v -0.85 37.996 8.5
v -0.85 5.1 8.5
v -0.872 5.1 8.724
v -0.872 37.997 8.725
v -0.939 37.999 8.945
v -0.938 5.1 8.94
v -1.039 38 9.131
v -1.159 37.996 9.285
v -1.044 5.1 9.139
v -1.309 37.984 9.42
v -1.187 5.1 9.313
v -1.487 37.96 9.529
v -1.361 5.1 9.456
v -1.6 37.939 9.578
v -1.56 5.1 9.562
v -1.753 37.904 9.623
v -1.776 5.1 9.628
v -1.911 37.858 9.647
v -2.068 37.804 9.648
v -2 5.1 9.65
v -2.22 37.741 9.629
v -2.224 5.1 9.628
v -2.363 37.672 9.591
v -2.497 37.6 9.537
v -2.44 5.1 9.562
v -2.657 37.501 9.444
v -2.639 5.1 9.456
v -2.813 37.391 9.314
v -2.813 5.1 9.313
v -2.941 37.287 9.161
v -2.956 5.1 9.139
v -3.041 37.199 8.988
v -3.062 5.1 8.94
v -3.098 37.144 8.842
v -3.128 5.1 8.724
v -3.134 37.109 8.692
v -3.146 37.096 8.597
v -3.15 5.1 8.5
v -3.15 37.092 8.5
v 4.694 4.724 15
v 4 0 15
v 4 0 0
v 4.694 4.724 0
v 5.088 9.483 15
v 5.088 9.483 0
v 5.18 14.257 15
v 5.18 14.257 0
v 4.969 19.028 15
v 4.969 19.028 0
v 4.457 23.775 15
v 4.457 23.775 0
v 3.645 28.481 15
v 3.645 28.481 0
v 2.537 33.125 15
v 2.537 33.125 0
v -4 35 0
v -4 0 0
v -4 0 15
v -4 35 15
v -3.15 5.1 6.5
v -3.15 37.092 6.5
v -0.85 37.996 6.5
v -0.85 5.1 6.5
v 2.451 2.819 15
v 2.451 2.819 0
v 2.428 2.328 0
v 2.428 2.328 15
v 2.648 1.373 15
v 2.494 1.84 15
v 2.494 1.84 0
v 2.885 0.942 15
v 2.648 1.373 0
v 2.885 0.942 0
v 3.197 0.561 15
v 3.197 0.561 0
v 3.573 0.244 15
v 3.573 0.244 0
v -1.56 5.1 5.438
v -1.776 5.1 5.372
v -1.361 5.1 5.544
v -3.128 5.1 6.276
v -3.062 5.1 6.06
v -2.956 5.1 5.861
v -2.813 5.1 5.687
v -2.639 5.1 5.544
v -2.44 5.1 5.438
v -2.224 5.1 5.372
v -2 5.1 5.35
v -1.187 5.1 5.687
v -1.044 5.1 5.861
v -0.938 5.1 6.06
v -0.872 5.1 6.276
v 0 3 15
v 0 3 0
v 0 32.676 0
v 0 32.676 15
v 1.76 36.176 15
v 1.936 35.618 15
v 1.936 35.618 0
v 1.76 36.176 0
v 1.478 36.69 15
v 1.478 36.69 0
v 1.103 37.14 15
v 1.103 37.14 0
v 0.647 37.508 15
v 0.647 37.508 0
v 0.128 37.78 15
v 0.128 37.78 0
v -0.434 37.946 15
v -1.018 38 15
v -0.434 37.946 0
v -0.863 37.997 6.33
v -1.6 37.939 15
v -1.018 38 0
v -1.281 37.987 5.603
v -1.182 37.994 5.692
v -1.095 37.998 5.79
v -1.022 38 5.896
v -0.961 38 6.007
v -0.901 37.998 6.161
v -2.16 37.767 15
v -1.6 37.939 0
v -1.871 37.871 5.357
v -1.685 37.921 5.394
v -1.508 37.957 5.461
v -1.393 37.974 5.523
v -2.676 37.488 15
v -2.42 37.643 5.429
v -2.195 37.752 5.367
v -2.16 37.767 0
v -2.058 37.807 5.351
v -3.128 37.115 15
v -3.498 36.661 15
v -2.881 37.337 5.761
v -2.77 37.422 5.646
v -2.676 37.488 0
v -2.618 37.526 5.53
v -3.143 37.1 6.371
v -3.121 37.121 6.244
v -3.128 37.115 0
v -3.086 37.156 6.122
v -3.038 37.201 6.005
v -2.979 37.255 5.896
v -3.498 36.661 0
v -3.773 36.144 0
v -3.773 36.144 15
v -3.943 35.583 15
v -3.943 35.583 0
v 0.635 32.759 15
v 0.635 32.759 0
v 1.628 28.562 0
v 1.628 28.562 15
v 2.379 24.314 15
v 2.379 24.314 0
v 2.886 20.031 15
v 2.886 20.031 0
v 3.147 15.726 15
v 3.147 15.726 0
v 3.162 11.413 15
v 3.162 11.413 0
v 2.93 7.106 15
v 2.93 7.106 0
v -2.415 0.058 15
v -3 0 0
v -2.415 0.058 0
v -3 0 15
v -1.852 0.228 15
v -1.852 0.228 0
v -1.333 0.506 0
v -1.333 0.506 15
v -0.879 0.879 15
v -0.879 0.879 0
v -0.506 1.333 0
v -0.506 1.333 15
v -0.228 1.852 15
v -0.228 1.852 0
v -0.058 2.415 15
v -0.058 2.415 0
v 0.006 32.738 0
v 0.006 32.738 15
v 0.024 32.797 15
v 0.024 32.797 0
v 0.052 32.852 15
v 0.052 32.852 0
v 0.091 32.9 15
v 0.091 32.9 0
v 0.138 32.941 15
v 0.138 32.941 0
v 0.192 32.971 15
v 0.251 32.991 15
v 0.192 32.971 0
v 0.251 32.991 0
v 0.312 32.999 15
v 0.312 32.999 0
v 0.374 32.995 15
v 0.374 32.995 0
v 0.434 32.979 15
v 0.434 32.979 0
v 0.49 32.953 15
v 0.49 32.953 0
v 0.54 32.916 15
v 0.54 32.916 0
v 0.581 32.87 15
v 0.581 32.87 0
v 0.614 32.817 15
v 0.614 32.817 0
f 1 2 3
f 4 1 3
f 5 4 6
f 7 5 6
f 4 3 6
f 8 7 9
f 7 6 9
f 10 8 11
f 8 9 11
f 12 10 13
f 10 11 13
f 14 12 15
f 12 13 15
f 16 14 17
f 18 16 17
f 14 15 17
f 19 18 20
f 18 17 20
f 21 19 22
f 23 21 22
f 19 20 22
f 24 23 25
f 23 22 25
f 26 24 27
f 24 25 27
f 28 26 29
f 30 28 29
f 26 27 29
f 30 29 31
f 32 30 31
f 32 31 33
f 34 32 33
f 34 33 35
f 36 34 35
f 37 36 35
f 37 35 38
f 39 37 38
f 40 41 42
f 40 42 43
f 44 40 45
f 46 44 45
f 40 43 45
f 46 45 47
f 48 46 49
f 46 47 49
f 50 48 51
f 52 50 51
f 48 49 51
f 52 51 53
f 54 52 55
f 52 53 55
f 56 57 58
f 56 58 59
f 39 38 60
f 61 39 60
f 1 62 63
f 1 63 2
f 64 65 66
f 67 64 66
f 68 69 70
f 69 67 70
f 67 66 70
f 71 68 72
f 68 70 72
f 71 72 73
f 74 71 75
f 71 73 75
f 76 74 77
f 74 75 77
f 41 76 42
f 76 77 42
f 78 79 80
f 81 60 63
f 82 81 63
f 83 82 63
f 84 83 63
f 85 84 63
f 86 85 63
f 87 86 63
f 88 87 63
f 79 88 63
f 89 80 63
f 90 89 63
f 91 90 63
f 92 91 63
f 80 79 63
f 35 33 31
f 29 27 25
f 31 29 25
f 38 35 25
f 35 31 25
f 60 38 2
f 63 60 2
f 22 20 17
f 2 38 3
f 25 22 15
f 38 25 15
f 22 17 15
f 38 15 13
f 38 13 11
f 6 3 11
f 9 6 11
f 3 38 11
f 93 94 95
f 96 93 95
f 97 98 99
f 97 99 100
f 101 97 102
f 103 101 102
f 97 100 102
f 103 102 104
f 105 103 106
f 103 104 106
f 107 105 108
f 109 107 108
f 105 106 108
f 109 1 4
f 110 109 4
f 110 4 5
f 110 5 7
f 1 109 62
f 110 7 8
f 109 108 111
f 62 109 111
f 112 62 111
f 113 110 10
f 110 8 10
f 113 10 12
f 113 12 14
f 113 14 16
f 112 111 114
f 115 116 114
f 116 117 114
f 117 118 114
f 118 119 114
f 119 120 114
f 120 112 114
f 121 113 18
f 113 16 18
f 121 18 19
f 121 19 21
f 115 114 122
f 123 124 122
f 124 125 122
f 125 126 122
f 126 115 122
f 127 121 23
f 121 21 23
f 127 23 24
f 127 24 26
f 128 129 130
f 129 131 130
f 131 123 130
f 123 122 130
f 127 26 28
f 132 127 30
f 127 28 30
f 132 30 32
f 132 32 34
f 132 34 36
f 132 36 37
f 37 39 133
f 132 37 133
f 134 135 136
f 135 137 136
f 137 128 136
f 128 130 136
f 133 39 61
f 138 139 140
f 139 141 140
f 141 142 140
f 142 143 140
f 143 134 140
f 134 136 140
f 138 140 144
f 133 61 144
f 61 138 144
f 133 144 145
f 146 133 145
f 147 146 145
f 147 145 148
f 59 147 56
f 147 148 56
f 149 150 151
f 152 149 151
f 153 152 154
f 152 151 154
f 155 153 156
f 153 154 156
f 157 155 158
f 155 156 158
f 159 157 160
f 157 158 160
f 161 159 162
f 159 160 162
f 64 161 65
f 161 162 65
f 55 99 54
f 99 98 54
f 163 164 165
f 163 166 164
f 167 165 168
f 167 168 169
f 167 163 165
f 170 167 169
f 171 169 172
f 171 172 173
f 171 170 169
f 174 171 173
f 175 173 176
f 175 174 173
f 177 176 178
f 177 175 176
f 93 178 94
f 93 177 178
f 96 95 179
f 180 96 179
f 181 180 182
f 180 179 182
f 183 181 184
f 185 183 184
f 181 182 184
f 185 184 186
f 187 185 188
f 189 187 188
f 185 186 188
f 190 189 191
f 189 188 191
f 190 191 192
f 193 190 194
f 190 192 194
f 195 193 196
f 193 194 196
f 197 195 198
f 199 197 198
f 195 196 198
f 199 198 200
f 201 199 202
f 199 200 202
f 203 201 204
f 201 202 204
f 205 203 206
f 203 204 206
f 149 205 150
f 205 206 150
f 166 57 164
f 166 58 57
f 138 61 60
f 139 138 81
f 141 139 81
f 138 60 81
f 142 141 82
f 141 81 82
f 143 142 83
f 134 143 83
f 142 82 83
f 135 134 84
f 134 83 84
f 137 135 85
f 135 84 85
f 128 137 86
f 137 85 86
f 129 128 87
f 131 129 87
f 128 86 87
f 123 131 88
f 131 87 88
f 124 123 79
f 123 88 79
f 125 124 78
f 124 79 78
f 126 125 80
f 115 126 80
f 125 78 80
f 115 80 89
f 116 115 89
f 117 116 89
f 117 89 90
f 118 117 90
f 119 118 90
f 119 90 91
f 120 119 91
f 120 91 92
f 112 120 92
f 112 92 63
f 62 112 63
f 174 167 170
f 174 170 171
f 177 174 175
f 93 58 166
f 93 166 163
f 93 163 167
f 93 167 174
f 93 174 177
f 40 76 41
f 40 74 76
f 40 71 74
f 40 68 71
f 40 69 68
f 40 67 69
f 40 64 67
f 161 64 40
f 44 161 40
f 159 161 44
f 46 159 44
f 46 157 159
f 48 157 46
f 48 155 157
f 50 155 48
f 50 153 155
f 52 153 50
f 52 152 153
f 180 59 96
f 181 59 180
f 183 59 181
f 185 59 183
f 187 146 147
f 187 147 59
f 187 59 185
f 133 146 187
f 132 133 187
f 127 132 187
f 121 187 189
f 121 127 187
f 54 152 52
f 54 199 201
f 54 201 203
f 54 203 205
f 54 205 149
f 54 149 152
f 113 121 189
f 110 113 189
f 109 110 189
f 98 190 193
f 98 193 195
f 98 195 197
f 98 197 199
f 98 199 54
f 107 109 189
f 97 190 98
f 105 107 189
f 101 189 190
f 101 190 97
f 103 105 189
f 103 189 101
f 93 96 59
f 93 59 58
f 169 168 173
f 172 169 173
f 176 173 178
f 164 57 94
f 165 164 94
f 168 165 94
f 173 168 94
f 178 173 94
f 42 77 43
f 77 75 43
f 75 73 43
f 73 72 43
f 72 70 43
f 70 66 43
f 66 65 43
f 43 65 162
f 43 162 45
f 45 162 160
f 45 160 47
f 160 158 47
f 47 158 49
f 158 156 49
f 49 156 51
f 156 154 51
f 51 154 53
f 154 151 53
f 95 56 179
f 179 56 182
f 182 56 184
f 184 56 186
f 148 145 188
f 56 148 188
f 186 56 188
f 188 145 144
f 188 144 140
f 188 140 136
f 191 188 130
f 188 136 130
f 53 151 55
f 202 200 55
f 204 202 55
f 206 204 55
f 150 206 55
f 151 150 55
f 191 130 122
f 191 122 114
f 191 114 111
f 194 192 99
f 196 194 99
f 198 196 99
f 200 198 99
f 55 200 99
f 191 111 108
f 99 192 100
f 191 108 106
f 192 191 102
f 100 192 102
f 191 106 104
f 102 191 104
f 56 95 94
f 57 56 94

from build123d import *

# Parameters (mm, degrees)
F0_W        = 4
F0_H        = 35
F1_DEPTH    = 15
F2_T1_DEPTH = 15
F3_T1_DEPTH = 29.2746233567
F5_DEPTH    = 47
F6_DEPTH    = 5.1
F7_R        = 3
F8_R        = 43.7697785777


# Not quite as in the source:
# - a fillet or chamfer that OpenCascade refuses, or shapes differently, is made with other operations: its cross-section is extruded or revolved along the edge and cut away or added


with BuildPart() as f1:
    # F0 (on Top) → F1 (new body)
    with BuildSketch(Plane.XY):
        with Locations((-2, 17.5)):
            Rectangle(F0_W, F0_H)
        with BuildLine():
            Line((-4, 35), (0, 35))
            ThreePointArc((0, 35), (3.0631994803, 17.6178971132), (2, 0))
            Line((2, 0), (4, 0))
            ThreePointArc((4, 0), (5.0631994803, 17.6178971132), (2, 35))
            ThreePointArc((2, 35), (-1, 38), (-4, 35))
        make_face()
    extrude(amount=F1_DEPTH)

    # F2: fillet of radius 0.3232070394 on 1 edges, made by hand

    # F2_s2 → F2_t1 (join)
    with BuildSketch(Plane.XY):
        with BuildLine():
            ThreePointArc((0, 32.6758460939), (0.2811660755, 32.9963072424), (0.635477172, 32.7592136813))
            ThreePointArc((0.635477172, 32.7592136813), (0.3263947733, 33.8820616974), (0, 35))
            Line((0, 35), (0, 32.6758460939))
        make_face()
    extrude(amount=F2_T1_DEPTH)

    # F3: fillet of radius 2.6852748766 on 1 edges, made by hand

    # F3_s2 → F3_t1 (cut)
    with BuildSketch(Plane.XY.offset(-7.1373116784)):
        with BuildLine():
            ThreePointArc((2.4511484812, 2.8190530195), (2.7567902003, 1.1519659503), (4, 0))
            Line((4, 0), (2, 0))
            ThreePointArc((2, 0), (2.2389229437, 1.4073902438), (2.4511484812, 2.8190530195))
        make_face()
    extrude(amount=F3_T1_DEPTH, mode=Mode.SUBTRACT)

    # F4 (on face) → F5 (cut)
    with BuildSketch(Plane.XZ):
        with BuildLine():
            ThreePointArc((-3.15, 6.5), (-2, 5.35), (-0.85, 6.5))
            Line((-0.85, 6.5), (-2, 6.5))
            Line((-2, 6.5), (-3.15, 6.5))
        make_face()
        with BuildLine():
            ThreePointArc((-0.85, 6.5), (-1.0061251438, 7.0785436631), (-1.4321091654, 7.5))
            ThreePointArc((-1.4321091654, 7.5), (-2, 7.35), (-2.5678908346, 7.5))
            ThreePointArc((-2.5678908346, 7.5), (-2.9938748562, 7.0785436631), (-3.15, 6.5))
            Line((-3.15, 6.5), (-2, 6.5))
            Line((-2, 6.5), (-0.85, 6.5))
        make_face()
        with BuildLine():
            ThreePointArc((-2.5678908346, 7.5), (-2.9938748562, 7.9214563369), (-3.15, 8.5))
            Line((-3.15, 8.5), (-3.15, 6.5))
            ThreePointArc((-3.15, 6.5), (-2.9938748562, 7.0785436631), (-2.5678908346, 7.5))
        make_face()
        with BuildLine():
            Line((-0.85, 6.5), (-0.85, 8.5))
            ThreePointArc((-0.85, 8.5), (-1.0061251438, 7.9214563369), (-1.4321091654, 7.5))
            ThreePointArc((-1.4321091654, 7.5), (-1.0061251438, 7.0785436631), (-0.85, 6.5))
        make_face()
        with BuildLine():
            ThreePointArc((-1.4321091654, 7.5), (-1.0061251438, 7.9214563369), (-0.85, 8.5))
            Line((-0.85, 8.5), (-2, 8.5))
            Line((-2, 8.5), (-3.15, 8.5))
            ThreePointArc((-3.15, 8.5), (-2.9938748562, 7.9214563369), (-2.5678908346, 7.5))
            ThreePointArc((-2.5678908346, 7.5), (-2, 7.35), (-1.4321091654, 7.5))
        make_face()
        with BuildLine():
            Line((-2, 8.5), (-0.85, 8.5))
            ThreePointArc((-0.85, 8.5), (-2, 9.65), (-3.15, 8.5))
            Line((-3.15, 8.5), (-2, 8.5))
        make_face()
    extrude(amount=-F5_DEPTH, mode=Mode.SUBTRACT)

    # F4 (on face) → F6 (join)
    with BuildSketch(Plane.XZ):
        with BuildLine():
            Line((-2, 8.5), (-0.85, 8.5))
            ThreePointArc((-0.85, 8.5), (-2, 9.65), (-3.15, 8.5))
            Line((-3.15, 8.5), (-2, 8.5))
        make_face()
        with BuildLine():
            ThreePointArc((-1.4321091654, 7.5), (-1.0061251438, 7.9214563369), (-0.85, 8.5))
            Line((-0.85, 8.5), (-2, 8.5))
            Line((-2, 8.5), (-3.15, 8.5))
            ThreePointArc((-3.15, 8.5), (-2.9938748562, 7.9214563369), (-2.5678908346, 7.5))
            ThreePointArc((-2.5678908346, 7.5), (-2, 7.35), (-1.4321091654, 7.5))
        make_face()
        with BuildLine():
            ThreePointArc((-3.15, 6.5), (-2, 5.35), (-0.85, 6.5))
            Line((-0.85, 6.5), (-2, 6.5))
            Line((-2, 6.5), (-3.15, 6.5))
        make_face()
        with BuildLine():
            ThreePointArc((-0.85, 6.5), (-1.0061251438, 7.0785436631), (-1.4321091654, 7.5))
            ThreePointArc((-1.4321091654, 7.5), (-2, 7.35), (-2.5678908346, 7.5))
            ThreePointArc((-2.5678908346, 7.5), (-2.9938748562, 7.0785436631), (-3.15, 6.5))
            Line((-3.15, 6.5), (-2, 6.5))
            Line((-2, 6.5), (-0.85, 6.5))
        make_face()
        with BuildLine():
            Line((-0.85, 6.5), (-0.85, 8.5))
            ThreePointArc((-0.85, 8.5), (-1.0061251438, 7.9214563369), (-1.4321091654, 7.5))
            ThreePointArc((-1.4321091654, 7.5), (-1.0061251438, 7.0785436631), (-0.85, 6.5))
        make_face()
        with BuildLine():
            ThreePointArc((-2.5678908346, 7.5), (-2.9938748562, 7.9214563369), (-3.15, 8.5))
            Line((-3.15, 8.5), (-3.15, 6.5))
            ThreePointArc((-3.15, 6.5), (-2.9938748562, 7.0785436631), (-2.5678908346, 7.5))
        make_face()
    extrude(amount=-F6_DEPTH)

    # F7
    f7_edges = [f1.edges().sort_by_distance(p)[0] for p in [
        (0, 0, 7.5),
    ]]
    fillet(f7_edges, radius=F7_R)

    # F8
    f8_edges = [f1.edges().sort_by_distance(p)[0] for p in [
        (2, 35, 7.5),
    ]]
    fillet(f8_edges, radius=F8_R)


solid = f1.part
